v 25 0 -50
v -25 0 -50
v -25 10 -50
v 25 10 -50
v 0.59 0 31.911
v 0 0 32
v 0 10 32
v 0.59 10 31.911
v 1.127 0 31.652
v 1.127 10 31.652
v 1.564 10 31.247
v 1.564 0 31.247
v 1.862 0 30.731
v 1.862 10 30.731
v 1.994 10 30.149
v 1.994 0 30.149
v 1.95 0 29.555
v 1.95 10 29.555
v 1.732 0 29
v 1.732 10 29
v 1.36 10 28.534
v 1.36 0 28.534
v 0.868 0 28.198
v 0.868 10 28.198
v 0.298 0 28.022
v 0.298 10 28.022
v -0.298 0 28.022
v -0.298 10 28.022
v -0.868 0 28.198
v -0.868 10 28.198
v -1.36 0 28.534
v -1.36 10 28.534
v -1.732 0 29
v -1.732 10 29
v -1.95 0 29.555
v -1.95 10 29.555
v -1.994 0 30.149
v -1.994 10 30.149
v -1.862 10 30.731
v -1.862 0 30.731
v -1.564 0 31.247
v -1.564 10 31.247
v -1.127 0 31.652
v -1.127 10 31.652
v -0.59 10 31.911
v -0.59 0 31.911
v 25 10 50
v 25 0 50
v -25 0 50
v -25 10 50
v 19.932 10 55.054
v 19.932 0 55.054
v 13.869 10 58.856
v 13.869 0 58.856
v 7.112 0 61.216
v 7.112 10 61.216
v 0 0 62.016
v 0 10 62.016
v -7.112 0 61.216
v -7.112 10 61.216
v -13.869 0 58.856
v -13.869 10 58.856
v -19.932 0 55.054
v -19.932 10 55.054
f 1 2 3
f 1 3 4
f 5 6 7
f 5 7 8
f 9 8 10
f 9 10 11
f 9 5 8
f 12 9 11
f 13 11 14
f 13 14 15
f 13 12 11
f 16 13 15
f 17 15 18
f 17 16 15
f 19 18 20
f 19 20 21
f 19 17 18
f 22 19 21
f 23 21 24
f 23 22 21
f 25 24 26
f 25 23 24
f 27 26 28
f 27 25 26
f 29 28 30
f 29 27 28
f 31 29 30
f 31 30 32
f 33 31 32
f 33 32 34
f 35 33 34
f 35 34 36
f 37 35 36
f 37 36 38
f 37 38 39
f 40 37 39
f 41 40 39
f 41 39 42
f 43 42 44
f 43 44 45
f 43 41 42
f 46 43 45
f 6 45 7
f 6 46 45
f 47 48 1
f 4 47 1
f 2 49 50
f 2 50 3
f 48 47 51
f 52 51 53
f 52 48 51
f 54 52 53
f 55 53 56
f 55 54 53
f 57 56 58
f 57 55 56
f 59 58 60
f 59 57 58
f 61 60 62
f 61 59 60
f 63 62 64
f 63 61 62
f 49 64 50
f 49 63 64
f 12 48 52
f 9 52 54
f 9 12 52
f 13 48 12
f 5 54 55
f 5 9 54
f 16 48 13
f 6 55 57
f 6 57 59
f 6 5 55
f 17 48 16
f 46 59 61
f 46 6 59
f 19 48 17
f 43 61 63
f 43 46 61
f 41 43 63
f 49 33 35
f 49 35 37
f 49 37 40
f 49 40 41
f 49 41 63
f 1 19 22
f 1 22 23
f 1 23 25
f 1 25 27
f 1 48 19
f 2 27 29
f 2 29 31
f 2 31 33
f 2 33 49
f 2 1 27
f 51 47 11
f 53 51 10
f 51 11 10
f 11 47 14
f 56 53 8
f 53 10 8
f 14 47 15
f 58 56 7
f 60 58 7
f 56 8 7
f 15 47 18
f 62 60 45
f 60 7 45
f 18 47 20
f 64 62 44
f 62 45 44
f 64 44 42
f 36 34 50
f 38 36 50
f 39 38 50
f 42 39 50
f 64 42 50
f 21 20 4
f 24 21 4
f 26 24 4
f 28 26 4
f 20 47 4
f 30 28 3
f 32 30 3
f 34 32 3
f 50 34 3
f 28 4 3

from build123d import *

# Parameters (mm, degrees)
SKETCH1_W           = 50
SKETCH1_H           = 100
SKETCH1_R           = 2
BOSS_EXTRUDE1_DEPTH = 10


with BuildPart() as part:
    # Sketch1 → Boss-Extrude1 (new body)
    # profile 1 of 2: a face of its own
    with BuildSketch(Plane(origin=(0, 0, 0), x_dir=(1, 0, 0), z_dir=(0, 1, 0))):
        Rectangle(SKETCH1_W, SKETCH1_H)
        with Locations(Location((0, -30, 0), (0, 0, 270))):
            Circle(SKETCH1_R, mode=Mode.SUBTRACT)
    # profile 2 of 2: a face of its own
    with BuildSketch(Plane(origin=(0, 0, 0), x_dir=(1, 0, 0), z_dir=(0, 1, 0))):
        with BuildLine():
            Line((-25, -50), (25, -50))
            ThreePointArc((25, -50), (0, -62.015621187), (-25, -50))
        make_face()
    extrude(amount=BOSS_EXTRUDE1_DEPTH)


solid = part.part
